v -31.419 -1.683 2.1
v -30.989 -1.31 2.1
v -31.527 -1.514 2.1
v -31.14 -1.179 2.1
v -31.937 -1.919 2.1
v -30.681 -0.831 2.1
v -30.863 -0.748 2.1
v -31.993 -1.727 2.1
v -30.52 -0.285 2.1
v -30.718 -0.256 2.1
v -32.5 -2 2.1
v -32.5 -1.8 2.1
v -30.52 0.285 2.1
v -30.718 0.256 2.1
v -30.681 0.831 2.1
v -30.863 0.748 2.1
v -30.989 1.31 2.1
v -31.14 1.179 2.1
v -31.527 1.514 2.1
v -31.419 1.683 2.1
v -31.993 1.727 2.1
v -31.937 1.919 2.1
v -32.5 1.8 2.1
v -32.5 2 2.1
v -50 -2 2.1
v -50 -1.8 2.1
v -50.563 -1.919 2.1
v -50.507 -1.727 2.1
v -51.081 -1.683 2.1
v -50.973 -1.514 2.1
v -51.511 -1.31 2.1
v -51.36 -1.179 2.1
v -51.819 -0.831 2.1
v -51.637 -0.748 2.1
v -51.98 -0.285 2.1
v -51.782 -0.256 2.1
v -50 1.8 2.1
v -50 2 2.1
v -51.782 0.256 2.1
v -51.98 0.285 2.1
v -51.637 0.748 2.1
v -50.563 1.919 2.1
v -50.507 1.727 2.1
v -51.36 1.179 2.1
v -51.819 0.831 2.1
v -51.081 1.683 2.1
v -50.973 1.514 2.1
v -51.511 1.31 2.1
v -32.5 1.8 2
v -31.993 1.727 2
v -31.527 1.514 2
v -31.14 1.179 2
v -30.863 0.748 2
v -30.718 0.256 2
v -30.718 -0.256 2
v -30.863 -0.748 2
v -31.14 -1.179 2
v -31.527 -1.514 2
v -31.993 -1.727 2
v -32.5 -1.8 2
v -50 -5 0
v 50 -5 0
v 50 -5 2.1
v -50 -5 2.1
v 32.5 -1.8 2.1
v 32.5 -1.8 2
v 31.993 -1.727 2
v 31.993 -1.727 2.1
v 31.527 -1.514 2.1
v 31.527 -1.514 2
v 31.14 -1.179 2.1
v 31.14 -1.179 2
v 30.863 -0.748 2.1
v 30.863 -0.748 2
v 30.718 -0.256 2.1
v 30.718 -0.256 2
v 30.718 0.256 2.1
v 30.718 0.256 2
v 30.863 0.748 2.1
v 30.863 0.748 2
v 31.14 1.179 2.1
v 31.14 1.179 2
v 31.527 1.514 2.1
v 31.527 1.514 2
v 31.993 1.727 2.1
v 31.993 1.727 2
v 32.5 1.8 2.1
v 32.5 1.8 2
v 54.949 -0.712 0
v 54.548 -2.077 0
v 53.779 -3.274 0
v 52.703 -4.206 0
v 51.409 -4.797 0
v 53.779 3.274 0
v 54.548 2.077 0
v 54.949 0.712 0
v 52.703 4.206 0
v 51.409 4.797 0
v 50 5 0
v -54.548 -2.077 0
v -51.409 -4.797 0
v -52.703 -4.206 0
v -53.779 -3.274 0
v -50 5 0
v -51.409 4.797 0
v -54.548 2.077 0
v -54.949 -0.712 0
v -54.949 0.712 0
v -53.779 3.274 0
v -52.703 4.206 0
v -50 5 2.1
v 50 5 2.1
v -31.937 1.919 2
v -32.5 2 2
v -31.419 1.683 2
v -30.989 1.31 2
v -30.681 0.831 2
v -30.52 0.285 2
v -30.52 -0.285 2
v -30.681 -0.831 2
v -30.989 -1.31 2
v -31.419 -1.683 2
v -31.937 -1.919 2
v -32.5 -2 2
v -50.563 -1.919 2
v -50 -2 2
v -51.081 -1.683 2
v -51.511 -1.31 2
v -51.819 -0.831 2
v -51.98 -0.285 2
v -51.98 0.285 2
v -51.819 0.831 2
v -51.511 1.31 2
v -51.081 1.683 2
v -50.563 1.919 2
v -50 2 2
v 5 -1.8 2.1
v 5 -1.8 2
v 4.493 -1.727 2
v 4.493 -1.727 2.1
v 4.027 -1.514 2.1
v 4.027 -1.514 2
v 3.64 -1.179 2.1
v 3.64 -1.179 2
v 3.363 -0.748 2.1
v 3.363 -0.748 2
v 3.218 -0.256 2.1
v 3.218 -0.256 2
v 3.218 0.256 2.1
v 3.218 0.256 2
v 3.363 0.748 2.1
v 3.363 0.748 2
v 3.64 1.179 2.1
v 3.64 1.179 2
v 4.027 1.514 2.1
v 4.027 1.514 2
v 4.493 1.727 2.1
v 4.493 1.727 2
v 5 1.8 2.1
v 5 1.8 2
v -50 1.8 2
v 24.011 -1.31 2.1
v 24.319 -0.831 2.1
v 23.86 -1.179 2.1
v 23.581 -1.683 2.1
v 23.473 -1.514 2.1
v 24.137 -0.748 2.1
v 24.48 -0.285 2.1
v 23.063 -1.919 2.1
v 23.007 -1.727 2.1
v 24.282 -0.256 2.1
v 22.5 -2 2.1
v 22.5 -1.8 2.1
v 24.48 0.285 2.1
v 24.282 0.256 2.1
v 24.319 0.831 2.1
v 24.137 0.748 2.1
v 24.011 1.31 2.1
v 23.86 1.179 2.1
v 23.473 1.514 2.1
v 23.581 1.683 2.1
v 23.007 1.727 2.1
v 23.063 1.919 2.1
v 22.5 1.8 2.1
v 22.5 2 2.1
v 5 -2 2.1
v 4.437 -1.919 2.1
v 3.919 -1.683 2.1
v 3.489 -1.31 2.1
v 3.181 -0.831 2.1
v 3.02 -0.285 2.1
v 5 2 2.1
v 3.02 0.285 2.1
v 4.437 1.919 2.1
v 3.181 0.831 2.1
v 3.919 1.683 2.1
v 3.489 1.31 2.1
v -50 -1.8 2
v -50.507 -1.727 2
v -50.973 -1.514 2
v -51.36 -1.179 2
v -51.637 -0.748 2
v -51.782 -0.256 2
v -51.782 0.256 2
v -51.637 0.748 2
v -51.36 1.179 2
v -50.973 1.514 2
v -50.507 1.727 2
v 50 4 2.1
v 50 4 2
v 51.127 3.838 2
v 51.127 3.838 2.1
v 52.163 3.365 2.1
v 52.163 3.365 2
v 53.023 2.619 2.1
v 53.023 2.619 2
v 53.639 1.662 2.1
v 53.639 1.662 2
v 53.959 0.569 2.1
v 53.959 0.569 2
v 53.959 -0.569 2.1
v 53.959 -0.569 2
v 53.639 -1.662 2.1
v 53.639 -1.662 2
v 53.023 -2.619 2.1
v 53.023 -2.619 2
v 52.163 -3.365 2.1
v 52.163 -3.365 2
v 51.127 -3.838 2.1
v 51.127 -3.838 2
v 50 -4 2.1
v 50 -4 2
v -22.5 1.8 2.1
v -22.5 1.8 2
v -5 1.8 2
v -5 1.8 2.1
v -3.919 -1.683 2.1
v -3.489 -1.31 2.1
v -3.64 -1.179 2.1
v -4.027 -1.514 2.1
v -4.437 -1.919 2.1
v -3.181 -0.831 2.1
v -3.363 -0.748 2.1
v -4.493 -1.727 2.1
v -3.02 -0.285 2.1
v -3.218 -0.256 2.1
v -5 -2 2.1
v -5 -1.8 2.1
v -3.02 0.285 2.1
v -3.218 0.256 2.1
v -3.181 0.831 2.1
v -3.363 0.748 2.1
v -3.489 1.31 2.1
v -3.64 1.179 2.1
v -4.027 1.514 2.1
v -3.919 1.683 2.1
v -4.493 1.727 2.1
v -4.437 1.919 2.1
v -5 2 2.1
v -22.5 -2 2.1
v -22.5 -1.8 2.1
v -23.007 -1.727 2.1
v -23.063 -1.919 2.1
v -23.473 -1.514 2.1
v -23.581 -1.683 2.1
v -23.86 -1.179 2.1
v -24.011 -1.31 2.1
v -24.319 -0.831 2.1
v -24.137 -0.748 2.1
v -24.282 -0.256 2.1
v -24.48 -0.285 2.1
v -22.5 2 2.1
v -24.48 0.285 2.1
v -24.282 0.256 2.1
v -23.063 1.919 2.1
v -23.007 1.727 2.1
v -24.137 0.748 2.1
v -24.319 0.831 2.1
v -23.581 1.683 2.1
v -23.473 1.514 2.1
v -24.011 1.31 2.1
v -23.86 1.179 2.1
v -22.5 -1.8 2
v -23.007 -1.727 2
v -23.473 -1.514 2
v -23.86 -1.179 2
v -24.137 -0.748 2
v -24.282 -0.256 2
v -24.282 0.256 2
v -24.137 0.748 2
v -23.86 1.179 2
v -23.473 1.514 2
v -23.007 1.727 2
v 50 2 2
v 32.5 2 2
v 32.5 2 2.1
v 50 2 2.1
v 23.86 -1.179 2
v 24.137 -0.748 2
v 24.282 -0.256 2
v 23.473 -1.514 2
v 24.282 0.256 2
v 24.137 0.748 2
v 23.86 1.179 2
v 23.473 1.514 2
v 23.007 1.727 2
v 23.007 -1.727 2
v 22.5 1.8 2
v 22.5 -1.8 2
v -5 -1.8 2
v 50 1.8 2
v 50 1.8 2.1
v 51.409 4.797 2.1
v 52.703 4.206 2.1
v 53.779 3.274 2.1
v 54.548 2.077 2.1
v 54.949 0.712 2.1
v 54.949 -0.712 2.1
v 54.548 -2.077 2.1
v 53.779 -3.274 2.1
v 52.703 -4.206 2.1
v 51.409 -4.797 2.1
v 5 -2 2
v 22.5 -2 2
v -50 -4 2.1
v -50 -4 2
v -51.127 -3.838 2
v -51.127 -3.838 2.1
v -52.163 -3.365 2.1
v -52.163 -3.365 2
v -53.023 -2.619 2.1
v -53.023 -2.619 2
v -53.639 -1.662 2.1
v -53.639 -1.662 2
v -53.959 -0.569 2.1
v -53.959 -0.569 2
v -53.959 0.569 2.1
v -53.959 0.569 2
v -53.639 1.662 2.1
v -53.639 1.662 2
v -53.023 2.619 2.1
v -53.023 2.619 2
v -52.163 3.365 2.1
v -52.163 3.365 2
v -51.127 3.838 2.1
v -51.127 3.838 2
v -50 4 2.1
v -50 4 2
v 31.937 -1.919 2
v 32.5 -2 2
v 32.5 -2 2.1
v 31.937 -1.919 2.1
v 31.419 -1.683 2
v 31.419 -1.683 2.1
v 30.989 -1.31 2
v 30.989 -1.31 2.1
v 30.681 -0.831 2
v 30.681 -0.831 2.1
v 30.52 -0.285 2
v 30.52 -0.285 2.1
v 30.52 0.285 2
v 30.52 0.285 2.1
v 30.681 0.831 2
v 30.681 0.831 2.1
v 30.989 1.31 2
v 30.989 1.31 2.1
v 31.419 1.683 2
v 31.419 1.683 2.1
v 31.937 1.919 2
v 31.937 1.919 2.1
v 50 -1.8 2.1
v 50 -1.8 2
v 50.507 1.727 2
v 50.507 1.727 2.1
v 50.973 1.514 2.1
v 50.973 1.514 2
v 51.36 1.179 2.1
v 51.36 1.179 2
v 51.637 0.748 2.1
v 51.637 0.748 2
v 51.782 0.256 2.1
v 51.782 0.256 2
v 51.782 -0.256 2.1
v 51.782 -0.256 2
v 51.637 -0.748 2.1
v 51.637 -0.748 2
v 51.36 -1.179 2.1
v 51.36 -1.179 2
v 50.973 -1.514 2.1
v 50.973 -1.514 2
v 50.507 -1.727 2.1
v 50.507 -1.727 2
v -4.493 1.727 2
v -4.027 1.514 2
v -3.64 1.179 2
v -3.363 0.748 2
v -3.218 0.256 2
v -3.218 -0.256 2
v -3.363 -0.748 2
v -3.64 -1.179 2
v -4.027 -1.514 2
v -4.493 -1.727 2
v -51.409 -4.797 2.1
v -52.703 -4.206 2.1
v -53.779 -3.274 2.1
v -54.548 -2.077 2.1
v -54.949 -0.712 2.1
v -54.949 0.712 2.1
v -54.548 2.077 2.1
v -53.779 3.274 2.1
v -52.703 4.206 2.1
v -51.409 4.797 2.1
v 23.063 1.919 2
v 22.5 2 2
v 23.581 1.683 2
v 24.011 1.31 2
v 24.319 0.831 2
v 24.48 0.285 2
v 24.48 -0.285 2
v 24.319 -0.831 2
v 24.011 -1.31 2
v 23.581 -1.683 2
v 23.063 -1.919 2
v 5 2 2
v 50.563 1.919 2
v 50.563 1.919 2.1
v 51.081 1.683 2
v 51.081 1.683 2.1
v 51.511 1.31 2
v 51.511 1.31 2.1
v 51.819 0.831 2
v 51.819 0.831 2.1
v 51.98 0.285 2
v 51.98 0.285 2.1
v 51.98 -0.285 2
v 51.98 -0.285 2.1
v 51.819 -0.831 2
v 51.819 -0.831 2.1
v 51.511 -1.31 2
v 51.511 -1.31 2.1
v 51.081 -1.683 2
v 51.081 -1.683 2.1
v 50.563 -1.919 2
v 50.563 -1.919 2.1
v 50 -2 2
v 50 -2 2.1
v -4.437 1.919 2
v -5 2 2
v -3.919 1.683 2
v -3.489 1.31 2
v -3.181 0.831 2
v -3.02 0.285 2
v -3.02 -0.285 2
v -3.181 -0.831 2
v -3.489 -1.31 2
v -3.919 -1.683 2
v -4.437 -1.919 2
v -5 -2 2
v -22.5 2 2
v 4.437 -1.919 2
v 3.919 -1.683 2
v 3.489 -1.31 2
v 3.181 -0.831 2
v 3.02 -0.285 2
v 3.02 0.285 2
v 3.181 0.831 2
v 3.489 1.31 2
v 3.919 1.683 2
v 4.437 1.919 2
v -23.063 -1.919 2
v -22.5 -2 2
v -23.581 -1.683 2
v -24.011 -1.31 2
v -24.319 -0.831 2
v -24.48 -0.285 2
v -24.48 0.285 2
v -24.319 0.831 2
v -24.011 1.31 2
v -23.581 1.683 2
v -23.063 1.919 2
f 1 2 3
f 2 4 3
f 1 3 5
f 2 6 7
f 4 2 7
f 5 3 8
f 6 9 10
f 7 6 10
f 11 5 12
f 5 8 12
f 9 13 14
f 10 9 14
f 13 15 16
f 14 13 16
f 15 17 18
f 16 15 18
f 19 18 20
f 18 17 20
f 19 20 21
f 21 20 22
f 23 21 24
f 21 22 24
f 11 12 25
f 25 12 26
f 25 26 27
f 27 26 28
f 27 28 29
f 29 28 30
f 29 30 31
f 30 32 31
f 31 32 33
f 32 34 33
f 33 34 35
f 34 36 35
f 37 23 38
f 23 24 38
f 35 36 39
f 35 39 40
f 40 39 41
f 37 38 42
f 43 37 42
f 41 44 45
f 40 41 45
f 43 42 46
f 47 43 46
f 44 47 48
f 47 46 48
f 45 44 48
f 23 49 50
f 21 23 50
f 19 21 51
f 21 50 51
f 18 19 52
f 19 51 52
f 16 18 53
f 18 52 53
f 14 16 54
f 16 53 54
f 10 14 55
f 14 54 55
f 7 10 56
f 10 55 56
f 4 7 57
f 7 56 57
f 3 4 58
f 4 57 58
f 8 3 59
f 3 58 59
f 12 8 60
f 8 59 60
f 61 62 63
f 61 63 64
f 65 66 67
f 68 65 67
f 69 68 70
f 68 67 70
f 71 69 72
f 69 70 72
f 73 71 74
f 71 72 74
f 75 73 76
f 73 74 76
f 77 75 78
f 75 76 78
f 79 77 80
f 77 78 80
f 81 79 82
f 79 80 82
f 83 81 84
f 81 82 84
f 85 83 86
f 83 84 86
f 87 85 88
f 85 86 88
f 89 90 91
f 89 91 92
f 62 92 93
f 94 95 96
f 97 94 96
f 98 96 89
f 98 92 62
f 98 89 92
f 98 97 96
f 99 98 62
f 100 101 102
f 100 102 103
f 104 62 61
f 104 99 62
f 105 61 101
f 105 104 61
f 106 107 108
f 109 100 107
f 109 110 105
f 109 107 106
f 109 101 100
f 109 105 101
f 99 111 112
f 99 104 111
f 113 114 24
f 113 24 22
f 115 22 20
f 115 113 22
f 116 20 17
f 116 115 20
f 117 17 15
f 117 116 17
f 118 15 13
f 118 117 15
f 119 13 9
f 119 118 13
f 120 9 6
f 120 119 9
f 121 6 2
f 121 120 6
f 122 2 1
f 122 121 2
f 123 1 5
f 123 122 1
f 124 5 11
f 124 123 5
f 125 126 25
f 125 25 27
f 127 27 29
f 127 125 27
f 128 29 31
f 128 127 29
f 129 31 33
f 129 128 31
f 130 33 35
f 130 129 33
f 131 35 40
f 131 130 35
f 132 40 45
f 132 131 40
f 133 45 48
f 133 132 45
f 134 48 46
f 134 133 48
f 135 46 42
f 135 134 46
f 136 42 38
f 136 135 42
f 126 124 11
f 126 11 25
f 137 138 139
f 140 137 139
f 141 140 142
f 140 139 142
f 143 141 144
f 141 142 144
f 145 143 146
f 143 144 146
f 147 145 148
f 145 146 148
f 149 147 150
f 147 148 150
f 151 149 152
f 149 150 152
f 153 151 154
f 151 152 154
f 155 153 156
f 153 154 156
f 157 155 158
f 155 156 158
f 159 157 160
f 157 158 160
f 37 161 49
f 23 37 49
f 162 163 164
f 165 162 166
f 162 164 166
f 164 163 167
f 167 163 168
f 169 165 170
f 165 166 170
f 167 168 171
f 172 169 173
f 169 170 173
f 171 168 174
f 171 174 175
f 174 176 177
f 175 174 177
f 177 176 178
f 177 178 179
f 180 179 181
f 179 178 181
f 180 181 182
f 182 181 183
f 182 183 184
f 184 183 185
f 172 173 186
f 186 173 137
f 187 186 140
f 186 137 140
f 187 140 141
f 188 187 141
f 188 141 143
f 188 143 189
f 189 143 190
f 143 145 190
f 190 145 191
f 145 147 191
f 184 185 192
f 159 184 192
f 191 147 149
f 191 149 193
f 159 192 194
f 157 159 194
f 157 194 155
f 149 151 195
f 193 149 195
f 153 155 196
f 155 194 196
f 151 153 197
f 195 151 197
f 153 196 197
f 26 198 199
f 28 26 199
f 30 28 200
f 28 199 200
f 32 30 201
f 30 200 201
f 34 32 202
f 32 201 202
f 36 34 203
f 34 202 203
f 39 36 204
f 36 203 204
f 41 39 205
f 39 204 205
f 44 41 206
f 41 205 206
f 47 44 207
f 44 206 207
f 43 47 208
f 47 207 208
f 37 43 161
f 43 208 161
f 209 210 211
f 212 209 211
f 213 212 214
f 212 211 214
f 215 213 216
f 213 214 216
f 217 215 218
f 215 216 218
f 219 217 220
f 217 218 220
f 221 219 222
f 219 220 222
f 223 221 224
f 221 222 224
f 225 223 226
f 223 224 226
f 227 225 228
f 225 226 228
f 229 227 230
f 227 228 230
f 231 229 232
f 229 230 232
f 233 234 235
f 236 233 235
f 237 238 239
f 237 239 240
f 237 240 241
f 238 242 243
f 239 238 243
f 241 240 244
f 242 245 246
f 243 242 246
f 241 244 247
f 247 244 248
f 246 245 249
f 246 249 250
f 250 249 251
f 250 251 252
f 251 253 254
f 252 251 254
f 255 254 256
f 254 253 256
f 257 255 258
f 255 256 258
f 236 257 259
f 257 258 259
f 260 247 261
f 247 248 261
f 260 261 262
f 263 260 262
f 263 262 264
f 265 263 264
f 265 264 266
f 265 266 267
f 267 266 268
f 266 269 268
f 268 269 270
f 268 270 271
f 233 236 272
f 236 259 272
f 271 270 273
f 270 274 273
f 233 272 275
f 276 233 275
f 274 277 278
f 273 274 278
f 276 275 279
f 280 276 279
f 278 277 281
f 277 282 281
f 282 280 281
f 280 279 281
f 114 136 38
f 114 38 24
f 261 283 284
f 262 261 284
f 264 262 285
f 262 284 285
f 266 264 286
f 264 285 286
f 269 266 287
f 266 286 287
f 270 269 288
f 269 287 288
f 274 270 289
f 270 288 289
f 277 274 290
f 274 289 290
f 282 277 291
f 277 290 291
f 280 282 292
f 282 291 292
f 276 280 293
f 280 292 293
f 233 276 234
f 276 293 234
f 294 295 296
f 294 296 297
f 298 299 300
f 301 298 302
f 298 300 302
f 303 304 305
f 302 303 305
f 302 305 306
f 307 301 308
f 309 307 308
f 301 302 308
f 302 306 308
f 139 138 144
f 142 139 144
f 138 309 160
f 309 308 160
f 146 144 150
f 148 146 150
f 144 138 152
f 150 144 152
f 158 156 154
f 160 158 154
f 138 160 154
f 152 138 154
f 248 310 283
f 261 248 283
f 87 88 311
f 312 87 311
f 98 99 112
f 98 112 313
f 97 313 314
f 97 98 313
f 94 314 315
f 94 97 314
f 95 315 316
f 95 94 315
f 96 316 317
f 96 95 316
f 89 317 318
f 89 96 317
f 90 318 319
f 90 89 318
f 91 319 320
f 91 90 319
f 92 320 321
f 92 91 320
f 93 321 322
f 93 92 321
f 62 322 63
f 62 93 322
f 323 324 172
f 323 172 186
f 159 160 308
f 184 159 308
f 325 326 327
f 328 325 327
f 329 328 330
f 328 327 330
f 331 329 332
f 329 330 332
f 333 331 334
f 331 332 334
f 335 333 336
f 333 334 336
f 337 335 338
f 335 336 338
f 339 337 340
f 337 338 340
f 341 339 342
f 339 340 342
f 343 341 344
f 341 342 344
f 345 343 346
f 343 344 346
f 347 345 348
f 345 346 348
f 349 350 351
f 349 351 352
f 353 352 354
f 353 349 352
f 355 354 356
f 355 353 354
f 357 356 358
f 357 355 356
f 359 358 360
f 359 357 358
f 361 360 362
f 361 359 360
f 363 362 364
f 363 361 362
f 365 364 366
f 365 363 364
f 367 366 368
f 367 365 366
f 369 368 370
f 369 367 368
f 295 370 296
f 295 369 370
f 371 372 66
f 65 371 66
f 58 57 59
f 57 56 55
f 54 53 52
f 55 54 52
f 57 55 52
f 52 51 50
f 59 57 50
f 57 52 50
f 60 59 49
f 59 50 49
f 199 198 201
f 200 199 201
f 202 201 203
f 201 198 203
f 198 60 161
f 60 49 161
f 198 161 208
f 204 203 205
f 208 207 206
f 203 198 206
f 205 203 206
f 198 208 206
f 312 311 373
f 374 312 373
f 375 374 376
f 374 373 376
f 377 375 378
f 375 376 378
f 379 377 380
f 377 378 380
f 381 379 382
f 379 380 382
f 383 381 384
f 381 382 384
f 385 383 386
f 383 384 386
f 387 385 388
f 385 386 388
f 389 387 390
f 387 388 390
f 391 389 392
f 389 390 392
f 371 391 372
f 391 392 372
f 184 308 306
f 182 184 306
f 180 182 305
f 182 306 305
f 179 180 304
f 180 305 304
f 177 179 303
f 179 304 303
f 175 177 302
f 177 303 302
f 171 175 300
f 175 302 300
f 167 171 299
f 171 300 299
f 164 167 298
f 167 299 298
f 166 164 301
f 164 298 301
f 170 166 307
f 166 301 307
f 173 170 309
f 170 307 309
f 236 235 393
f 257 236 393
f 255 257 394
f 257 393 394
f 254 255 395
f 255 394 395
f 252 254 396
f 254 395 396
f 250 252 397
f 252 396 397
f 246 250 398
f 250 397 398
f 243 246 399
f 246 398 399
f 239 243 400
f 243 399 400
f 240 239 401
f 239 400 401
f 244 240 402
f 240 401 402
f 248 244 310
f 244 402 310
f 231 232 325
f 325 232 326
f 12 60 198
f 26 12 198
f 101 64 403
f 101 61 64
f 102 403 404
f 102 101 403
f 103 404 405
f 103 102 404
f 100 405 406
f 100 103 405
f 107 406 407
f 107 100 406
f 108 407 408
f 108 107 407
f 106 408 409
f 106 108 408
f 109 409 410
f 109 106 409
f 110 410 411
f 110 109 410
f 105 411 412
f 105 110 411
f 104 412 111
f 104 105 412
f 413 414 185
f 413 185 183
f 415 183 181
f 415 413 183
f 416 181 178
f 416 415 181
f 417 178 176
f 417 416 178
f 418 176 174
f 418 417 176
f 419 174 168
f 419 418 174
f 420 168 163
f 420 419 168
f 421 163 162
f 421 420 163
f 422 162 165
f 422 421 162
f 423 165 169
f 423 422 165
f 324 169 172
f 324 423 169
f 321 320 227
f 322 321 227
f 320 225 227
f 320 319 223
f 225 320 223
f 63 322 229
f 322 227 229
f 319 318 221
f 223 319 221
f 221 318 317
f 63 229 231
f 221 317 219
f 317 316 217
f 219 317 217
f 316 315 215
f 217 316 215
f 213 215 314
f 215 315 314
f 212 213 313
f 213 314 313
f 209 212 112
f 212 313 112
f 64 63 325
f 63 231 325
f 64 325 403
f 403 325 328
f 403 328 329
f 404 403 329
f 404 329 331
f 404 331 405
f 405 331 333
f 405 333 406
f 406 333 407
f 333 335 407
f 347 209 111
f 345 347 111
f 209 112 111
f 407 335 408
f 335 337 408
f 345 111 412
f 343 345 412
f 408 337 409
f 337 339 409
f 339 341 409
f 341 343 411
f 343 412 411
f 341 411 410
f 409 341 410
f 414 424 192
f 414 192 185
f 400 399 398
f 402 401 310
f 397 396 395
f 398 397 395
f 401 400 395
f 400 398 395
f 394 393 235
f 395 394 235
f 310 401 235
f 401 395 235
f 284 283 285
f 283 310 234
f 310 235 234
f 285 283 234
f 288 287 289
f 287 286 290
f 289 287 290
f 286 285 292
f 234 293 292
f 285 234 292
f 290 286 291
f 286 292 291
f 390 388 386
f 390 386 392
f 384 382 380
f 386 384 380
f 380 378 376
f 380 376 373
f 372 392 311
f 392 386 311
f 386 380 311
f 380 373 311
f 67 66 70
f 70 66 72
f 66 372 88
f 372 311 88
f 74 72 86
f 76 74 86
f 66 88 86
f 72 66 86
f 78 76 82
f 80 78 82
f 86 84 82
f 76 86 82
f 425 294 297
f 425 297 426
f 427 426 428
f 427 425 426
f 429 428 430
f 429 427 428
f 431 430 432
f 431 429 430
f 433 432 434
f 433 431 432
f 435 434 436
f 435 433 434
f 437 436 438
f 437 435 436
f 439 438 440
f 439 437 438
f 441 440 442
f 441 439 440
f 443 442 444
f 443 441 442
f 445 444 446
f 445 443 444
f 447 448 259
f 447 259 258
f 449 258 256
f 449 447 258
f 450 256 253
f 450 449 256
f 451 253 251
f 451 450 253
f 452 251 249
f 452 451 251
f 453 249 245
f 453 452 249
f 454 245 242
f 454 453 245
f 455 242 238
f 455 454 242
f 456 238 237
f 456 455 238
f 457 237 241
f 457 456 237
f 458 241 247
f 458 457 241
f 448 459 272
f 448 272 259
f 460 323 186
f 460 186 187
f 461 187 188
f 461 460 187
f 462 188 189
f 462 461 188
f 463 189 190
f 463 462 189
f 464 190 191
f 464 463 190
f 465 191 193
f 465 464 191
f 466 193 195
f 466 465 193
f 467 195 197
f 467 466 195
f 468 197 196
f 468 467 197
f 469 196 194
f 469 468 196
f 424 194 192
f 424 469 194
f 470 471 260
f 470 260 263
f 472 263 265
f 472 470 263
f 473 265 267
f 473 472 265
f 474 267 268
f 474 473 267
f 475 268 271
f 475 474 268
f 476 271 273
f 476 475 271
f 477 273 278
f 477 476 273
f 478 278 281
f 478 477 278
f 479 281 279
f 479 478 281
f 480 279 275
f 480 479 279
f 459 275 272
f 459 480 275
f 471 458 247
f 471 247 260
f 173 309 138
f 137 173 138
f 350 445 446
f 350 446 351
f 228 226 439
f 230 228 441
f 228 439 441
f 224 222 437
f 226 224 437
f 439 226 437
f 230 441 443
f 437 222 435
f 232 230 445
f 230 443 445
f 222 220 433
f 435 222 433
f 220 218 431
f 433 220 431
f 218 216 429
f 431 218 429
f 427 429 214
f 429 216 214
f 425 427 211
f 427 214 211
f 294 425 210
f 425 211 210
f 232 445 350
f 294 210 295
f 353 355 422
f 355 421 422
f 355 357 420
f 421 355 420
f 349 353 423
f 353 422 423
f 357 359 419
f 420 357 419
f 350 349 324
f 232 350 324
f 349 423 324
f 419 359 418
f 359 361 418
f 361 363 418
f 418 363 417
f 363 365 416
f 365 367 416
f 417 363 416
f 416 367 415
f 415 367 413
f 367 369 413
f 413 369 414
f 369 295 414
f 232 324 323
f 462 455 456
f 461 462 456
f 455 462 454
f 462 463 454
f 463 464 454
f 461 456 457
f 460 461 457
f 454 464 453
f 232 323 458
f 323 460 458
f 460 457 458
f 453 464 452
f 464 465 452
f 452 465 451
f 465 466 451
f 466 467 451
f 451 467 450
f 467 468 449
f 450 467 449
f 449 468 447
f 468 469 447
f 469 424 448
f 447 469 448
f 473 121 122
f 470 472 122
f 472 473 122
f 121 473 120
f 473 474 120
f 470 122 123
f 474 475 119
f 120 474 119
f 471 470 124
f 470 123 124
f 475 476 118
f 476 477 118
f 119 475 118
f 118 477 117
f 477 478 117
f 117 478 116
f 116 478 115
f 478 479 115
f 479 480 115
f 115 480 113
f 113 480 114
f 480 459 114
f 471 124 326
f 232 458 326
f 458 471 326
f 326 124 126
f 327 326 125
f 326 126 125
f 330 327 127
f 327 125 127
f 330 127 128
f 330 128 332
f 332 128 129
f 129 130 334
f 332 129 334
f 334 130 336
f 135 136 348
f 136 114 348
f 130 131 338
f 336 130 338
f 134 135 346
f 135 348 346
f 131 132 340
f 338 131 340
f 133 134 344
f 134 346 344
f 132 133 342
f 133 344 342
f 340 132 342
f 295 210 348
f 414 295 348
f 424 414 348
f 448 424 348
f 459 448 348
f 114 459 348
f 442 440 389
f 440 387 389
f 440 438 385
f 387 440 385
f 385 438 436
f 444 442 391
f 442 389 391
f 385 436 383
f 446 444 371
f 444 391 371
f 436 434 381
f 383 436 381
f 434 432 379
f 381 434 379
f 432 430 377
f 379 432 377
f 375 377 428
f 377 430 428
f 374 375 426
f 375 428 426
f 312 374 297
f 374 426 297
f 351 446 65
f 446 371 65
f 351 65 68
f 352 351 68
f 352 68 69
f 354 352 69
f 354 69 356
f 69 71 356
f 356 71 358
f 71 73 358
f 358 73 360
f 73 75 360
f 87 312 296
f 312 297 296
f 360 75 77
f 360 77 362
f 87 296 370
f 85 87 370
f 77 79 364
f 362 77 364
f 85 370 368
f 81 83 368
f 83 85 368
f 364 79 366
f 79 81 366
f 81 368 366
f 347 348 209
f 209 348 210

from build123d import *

# Parameters (mm, degrees)
EXTRUDE1_DEPTH = 2
EXTRUDE2_DEPTH = 0.1
EXTRUDE3_DEPTH = 0.1


with BuildPart() as part:
    # Sketch1 → Extrude1 (new body)
    with BuildSketch(Plane.XY):
        with BuildLine():
            Line((-50, 5), (50, 5))
            ThreePointArc((50, 5), (55, 0), (50, -5))
            Line((50, -5), (-50, -5))
            ThreePointArc((-50, -5), (-55, 0), (-50, 5))
        make_face()
    extrude(amount=EXTRUDE1_DEPTH)

    # Sketch2 → Extrude2 (add)
    with BuildSketch(Plane.XY.offset(2)):
        with BuildLine():
            Line((-50, 5), (50, 5))
            ThreePointArc((50, 5), (55, 0), (50, -5))
            Line((50, -5), (-50, -5))
            ThreePointArc((-50, -5), (-55, 0), (-50, 5))
        make_face()
        with BuildLine():
            Line((-50, 4), (50, 4))
            ThreePointArc((50, 4), (54, 0), (50, -4))
            Line((50, -4), (-50, -4))
            ThreePointArc((-50, -4), (-54, 0), (-50, 4))
        make_face(mode=Mode.SUBTRACT)
    extrude(amount=EXTRUDE2_DEPTH)

    # Sketch3 → Extrude3 (add)
    with BuildSketch(Plane.XY.offset(2)):
        with BuildLine():
            Line((-49.999999498, 2), (-32.499999623, 2))
            ThreePointArc((-32.499999623, 2), (-30.499999623, 0), (-32.499999623, -2))
            Line((-32.499999623, -2), (-49.999999498, -2))
            ThreePointArc((-49.999999498, -2), (-51.999999498, 0), (-49.999999498, 2))
        make_face()
        with BuildLine():
            Line((-50, 1.8), (-32.499999623, 1.8))
            ThreePointArc((-32.499999623, 1.8), (-30.699999623, 0), (-32.499999623, -1.8))
            Line((-32.499999623, -1.8), (-50, -1.8))
            ThreePointArc((-50, -1.8), (-51.8, 0), (-50, 1.8))
        make_face(mode=Mode.SUBTRACT)
        with BuildLine():
            Line((-22.499999623, 2), (-4.999999749, 2))
            ThreePointArc((-4.999999749, 2), (-2.999999749, 0), (-4.999999749, -2))
            Line((-4.999999749, -2), (-22.499999623, -2))
            ThreePointArc((-22.499999623, -2), (-24.499999623, 0), (-22.499999623, 2))
        make_face()
        with BuildLine():
            Line((-22.499999623, 1.8), (-4.999999749, 1.8))
            ThreePointArc((-4.999999749, 1.8), (-3.199999749, 0), (-4.999999749, -1.8))
            Line((-4.999999749, -1.8), (-22.499999623, -1.8))
            ThreePointArc((-22.499999623, -1.8), (-24.299999623, 0), (-22.499999623, 1.8))
        make_face(mode=Mode.SUBTRACT)
        with BuildLine():
            Line((5.000000251, 2), (22.500000126, 2))
            ThreePointArc((22.500000126, 2), (24.500000126, 0), (22.500000126, -2))
            Line((22.500000126, -2), (5.000000251, -2))
            ThreePointArc((5.000000251, -2), (3.000000251, 0), (5.000000251, 2))
        make_face()
        with BuildLine():
            Line((5.000000251, 1.8), (22.500000126, 1.8))
            ThreePointArc((22.500000126, 1.8), (24.300000126, 0), (22.500000126, -1.8))
            Line((22.500000126, -1.8), (5.000000251, -1.8))
            ThreePointArc((5.000000251, -1.8), (3.200000251, 0), (5.000000251, 1.8))
        make_face(mode=Mode.SUBTRACT)
        with BuildLine():
            Line((32.500000126, 2), (50, 2))
            ThreePointArc((50, 2), (52, 0), (50, -2))
            Line((50, -2), (32.500000126, -2))
            ThreePointArc((32.500000126, -2), (30.500000126, 0), (32.500000126, 2))
        make_face()
        with BuildLine():
            Line((32.500000126, 1.8), (50, 1.8))
            ThreePointArc((50, 1.8), (51.8, 0), (50, -1.8))
            Line((50, -1.8), (32.500000126, -1.8))
            ThreePointArc((32.500000126, -1.8), (30.700000126, 0), (32.500000126, 1.8))
        make_face(mode=Mode.SUBTRACT)
    extrude(amount=EXTRUDE3_DEPTH)


solid = part.part
